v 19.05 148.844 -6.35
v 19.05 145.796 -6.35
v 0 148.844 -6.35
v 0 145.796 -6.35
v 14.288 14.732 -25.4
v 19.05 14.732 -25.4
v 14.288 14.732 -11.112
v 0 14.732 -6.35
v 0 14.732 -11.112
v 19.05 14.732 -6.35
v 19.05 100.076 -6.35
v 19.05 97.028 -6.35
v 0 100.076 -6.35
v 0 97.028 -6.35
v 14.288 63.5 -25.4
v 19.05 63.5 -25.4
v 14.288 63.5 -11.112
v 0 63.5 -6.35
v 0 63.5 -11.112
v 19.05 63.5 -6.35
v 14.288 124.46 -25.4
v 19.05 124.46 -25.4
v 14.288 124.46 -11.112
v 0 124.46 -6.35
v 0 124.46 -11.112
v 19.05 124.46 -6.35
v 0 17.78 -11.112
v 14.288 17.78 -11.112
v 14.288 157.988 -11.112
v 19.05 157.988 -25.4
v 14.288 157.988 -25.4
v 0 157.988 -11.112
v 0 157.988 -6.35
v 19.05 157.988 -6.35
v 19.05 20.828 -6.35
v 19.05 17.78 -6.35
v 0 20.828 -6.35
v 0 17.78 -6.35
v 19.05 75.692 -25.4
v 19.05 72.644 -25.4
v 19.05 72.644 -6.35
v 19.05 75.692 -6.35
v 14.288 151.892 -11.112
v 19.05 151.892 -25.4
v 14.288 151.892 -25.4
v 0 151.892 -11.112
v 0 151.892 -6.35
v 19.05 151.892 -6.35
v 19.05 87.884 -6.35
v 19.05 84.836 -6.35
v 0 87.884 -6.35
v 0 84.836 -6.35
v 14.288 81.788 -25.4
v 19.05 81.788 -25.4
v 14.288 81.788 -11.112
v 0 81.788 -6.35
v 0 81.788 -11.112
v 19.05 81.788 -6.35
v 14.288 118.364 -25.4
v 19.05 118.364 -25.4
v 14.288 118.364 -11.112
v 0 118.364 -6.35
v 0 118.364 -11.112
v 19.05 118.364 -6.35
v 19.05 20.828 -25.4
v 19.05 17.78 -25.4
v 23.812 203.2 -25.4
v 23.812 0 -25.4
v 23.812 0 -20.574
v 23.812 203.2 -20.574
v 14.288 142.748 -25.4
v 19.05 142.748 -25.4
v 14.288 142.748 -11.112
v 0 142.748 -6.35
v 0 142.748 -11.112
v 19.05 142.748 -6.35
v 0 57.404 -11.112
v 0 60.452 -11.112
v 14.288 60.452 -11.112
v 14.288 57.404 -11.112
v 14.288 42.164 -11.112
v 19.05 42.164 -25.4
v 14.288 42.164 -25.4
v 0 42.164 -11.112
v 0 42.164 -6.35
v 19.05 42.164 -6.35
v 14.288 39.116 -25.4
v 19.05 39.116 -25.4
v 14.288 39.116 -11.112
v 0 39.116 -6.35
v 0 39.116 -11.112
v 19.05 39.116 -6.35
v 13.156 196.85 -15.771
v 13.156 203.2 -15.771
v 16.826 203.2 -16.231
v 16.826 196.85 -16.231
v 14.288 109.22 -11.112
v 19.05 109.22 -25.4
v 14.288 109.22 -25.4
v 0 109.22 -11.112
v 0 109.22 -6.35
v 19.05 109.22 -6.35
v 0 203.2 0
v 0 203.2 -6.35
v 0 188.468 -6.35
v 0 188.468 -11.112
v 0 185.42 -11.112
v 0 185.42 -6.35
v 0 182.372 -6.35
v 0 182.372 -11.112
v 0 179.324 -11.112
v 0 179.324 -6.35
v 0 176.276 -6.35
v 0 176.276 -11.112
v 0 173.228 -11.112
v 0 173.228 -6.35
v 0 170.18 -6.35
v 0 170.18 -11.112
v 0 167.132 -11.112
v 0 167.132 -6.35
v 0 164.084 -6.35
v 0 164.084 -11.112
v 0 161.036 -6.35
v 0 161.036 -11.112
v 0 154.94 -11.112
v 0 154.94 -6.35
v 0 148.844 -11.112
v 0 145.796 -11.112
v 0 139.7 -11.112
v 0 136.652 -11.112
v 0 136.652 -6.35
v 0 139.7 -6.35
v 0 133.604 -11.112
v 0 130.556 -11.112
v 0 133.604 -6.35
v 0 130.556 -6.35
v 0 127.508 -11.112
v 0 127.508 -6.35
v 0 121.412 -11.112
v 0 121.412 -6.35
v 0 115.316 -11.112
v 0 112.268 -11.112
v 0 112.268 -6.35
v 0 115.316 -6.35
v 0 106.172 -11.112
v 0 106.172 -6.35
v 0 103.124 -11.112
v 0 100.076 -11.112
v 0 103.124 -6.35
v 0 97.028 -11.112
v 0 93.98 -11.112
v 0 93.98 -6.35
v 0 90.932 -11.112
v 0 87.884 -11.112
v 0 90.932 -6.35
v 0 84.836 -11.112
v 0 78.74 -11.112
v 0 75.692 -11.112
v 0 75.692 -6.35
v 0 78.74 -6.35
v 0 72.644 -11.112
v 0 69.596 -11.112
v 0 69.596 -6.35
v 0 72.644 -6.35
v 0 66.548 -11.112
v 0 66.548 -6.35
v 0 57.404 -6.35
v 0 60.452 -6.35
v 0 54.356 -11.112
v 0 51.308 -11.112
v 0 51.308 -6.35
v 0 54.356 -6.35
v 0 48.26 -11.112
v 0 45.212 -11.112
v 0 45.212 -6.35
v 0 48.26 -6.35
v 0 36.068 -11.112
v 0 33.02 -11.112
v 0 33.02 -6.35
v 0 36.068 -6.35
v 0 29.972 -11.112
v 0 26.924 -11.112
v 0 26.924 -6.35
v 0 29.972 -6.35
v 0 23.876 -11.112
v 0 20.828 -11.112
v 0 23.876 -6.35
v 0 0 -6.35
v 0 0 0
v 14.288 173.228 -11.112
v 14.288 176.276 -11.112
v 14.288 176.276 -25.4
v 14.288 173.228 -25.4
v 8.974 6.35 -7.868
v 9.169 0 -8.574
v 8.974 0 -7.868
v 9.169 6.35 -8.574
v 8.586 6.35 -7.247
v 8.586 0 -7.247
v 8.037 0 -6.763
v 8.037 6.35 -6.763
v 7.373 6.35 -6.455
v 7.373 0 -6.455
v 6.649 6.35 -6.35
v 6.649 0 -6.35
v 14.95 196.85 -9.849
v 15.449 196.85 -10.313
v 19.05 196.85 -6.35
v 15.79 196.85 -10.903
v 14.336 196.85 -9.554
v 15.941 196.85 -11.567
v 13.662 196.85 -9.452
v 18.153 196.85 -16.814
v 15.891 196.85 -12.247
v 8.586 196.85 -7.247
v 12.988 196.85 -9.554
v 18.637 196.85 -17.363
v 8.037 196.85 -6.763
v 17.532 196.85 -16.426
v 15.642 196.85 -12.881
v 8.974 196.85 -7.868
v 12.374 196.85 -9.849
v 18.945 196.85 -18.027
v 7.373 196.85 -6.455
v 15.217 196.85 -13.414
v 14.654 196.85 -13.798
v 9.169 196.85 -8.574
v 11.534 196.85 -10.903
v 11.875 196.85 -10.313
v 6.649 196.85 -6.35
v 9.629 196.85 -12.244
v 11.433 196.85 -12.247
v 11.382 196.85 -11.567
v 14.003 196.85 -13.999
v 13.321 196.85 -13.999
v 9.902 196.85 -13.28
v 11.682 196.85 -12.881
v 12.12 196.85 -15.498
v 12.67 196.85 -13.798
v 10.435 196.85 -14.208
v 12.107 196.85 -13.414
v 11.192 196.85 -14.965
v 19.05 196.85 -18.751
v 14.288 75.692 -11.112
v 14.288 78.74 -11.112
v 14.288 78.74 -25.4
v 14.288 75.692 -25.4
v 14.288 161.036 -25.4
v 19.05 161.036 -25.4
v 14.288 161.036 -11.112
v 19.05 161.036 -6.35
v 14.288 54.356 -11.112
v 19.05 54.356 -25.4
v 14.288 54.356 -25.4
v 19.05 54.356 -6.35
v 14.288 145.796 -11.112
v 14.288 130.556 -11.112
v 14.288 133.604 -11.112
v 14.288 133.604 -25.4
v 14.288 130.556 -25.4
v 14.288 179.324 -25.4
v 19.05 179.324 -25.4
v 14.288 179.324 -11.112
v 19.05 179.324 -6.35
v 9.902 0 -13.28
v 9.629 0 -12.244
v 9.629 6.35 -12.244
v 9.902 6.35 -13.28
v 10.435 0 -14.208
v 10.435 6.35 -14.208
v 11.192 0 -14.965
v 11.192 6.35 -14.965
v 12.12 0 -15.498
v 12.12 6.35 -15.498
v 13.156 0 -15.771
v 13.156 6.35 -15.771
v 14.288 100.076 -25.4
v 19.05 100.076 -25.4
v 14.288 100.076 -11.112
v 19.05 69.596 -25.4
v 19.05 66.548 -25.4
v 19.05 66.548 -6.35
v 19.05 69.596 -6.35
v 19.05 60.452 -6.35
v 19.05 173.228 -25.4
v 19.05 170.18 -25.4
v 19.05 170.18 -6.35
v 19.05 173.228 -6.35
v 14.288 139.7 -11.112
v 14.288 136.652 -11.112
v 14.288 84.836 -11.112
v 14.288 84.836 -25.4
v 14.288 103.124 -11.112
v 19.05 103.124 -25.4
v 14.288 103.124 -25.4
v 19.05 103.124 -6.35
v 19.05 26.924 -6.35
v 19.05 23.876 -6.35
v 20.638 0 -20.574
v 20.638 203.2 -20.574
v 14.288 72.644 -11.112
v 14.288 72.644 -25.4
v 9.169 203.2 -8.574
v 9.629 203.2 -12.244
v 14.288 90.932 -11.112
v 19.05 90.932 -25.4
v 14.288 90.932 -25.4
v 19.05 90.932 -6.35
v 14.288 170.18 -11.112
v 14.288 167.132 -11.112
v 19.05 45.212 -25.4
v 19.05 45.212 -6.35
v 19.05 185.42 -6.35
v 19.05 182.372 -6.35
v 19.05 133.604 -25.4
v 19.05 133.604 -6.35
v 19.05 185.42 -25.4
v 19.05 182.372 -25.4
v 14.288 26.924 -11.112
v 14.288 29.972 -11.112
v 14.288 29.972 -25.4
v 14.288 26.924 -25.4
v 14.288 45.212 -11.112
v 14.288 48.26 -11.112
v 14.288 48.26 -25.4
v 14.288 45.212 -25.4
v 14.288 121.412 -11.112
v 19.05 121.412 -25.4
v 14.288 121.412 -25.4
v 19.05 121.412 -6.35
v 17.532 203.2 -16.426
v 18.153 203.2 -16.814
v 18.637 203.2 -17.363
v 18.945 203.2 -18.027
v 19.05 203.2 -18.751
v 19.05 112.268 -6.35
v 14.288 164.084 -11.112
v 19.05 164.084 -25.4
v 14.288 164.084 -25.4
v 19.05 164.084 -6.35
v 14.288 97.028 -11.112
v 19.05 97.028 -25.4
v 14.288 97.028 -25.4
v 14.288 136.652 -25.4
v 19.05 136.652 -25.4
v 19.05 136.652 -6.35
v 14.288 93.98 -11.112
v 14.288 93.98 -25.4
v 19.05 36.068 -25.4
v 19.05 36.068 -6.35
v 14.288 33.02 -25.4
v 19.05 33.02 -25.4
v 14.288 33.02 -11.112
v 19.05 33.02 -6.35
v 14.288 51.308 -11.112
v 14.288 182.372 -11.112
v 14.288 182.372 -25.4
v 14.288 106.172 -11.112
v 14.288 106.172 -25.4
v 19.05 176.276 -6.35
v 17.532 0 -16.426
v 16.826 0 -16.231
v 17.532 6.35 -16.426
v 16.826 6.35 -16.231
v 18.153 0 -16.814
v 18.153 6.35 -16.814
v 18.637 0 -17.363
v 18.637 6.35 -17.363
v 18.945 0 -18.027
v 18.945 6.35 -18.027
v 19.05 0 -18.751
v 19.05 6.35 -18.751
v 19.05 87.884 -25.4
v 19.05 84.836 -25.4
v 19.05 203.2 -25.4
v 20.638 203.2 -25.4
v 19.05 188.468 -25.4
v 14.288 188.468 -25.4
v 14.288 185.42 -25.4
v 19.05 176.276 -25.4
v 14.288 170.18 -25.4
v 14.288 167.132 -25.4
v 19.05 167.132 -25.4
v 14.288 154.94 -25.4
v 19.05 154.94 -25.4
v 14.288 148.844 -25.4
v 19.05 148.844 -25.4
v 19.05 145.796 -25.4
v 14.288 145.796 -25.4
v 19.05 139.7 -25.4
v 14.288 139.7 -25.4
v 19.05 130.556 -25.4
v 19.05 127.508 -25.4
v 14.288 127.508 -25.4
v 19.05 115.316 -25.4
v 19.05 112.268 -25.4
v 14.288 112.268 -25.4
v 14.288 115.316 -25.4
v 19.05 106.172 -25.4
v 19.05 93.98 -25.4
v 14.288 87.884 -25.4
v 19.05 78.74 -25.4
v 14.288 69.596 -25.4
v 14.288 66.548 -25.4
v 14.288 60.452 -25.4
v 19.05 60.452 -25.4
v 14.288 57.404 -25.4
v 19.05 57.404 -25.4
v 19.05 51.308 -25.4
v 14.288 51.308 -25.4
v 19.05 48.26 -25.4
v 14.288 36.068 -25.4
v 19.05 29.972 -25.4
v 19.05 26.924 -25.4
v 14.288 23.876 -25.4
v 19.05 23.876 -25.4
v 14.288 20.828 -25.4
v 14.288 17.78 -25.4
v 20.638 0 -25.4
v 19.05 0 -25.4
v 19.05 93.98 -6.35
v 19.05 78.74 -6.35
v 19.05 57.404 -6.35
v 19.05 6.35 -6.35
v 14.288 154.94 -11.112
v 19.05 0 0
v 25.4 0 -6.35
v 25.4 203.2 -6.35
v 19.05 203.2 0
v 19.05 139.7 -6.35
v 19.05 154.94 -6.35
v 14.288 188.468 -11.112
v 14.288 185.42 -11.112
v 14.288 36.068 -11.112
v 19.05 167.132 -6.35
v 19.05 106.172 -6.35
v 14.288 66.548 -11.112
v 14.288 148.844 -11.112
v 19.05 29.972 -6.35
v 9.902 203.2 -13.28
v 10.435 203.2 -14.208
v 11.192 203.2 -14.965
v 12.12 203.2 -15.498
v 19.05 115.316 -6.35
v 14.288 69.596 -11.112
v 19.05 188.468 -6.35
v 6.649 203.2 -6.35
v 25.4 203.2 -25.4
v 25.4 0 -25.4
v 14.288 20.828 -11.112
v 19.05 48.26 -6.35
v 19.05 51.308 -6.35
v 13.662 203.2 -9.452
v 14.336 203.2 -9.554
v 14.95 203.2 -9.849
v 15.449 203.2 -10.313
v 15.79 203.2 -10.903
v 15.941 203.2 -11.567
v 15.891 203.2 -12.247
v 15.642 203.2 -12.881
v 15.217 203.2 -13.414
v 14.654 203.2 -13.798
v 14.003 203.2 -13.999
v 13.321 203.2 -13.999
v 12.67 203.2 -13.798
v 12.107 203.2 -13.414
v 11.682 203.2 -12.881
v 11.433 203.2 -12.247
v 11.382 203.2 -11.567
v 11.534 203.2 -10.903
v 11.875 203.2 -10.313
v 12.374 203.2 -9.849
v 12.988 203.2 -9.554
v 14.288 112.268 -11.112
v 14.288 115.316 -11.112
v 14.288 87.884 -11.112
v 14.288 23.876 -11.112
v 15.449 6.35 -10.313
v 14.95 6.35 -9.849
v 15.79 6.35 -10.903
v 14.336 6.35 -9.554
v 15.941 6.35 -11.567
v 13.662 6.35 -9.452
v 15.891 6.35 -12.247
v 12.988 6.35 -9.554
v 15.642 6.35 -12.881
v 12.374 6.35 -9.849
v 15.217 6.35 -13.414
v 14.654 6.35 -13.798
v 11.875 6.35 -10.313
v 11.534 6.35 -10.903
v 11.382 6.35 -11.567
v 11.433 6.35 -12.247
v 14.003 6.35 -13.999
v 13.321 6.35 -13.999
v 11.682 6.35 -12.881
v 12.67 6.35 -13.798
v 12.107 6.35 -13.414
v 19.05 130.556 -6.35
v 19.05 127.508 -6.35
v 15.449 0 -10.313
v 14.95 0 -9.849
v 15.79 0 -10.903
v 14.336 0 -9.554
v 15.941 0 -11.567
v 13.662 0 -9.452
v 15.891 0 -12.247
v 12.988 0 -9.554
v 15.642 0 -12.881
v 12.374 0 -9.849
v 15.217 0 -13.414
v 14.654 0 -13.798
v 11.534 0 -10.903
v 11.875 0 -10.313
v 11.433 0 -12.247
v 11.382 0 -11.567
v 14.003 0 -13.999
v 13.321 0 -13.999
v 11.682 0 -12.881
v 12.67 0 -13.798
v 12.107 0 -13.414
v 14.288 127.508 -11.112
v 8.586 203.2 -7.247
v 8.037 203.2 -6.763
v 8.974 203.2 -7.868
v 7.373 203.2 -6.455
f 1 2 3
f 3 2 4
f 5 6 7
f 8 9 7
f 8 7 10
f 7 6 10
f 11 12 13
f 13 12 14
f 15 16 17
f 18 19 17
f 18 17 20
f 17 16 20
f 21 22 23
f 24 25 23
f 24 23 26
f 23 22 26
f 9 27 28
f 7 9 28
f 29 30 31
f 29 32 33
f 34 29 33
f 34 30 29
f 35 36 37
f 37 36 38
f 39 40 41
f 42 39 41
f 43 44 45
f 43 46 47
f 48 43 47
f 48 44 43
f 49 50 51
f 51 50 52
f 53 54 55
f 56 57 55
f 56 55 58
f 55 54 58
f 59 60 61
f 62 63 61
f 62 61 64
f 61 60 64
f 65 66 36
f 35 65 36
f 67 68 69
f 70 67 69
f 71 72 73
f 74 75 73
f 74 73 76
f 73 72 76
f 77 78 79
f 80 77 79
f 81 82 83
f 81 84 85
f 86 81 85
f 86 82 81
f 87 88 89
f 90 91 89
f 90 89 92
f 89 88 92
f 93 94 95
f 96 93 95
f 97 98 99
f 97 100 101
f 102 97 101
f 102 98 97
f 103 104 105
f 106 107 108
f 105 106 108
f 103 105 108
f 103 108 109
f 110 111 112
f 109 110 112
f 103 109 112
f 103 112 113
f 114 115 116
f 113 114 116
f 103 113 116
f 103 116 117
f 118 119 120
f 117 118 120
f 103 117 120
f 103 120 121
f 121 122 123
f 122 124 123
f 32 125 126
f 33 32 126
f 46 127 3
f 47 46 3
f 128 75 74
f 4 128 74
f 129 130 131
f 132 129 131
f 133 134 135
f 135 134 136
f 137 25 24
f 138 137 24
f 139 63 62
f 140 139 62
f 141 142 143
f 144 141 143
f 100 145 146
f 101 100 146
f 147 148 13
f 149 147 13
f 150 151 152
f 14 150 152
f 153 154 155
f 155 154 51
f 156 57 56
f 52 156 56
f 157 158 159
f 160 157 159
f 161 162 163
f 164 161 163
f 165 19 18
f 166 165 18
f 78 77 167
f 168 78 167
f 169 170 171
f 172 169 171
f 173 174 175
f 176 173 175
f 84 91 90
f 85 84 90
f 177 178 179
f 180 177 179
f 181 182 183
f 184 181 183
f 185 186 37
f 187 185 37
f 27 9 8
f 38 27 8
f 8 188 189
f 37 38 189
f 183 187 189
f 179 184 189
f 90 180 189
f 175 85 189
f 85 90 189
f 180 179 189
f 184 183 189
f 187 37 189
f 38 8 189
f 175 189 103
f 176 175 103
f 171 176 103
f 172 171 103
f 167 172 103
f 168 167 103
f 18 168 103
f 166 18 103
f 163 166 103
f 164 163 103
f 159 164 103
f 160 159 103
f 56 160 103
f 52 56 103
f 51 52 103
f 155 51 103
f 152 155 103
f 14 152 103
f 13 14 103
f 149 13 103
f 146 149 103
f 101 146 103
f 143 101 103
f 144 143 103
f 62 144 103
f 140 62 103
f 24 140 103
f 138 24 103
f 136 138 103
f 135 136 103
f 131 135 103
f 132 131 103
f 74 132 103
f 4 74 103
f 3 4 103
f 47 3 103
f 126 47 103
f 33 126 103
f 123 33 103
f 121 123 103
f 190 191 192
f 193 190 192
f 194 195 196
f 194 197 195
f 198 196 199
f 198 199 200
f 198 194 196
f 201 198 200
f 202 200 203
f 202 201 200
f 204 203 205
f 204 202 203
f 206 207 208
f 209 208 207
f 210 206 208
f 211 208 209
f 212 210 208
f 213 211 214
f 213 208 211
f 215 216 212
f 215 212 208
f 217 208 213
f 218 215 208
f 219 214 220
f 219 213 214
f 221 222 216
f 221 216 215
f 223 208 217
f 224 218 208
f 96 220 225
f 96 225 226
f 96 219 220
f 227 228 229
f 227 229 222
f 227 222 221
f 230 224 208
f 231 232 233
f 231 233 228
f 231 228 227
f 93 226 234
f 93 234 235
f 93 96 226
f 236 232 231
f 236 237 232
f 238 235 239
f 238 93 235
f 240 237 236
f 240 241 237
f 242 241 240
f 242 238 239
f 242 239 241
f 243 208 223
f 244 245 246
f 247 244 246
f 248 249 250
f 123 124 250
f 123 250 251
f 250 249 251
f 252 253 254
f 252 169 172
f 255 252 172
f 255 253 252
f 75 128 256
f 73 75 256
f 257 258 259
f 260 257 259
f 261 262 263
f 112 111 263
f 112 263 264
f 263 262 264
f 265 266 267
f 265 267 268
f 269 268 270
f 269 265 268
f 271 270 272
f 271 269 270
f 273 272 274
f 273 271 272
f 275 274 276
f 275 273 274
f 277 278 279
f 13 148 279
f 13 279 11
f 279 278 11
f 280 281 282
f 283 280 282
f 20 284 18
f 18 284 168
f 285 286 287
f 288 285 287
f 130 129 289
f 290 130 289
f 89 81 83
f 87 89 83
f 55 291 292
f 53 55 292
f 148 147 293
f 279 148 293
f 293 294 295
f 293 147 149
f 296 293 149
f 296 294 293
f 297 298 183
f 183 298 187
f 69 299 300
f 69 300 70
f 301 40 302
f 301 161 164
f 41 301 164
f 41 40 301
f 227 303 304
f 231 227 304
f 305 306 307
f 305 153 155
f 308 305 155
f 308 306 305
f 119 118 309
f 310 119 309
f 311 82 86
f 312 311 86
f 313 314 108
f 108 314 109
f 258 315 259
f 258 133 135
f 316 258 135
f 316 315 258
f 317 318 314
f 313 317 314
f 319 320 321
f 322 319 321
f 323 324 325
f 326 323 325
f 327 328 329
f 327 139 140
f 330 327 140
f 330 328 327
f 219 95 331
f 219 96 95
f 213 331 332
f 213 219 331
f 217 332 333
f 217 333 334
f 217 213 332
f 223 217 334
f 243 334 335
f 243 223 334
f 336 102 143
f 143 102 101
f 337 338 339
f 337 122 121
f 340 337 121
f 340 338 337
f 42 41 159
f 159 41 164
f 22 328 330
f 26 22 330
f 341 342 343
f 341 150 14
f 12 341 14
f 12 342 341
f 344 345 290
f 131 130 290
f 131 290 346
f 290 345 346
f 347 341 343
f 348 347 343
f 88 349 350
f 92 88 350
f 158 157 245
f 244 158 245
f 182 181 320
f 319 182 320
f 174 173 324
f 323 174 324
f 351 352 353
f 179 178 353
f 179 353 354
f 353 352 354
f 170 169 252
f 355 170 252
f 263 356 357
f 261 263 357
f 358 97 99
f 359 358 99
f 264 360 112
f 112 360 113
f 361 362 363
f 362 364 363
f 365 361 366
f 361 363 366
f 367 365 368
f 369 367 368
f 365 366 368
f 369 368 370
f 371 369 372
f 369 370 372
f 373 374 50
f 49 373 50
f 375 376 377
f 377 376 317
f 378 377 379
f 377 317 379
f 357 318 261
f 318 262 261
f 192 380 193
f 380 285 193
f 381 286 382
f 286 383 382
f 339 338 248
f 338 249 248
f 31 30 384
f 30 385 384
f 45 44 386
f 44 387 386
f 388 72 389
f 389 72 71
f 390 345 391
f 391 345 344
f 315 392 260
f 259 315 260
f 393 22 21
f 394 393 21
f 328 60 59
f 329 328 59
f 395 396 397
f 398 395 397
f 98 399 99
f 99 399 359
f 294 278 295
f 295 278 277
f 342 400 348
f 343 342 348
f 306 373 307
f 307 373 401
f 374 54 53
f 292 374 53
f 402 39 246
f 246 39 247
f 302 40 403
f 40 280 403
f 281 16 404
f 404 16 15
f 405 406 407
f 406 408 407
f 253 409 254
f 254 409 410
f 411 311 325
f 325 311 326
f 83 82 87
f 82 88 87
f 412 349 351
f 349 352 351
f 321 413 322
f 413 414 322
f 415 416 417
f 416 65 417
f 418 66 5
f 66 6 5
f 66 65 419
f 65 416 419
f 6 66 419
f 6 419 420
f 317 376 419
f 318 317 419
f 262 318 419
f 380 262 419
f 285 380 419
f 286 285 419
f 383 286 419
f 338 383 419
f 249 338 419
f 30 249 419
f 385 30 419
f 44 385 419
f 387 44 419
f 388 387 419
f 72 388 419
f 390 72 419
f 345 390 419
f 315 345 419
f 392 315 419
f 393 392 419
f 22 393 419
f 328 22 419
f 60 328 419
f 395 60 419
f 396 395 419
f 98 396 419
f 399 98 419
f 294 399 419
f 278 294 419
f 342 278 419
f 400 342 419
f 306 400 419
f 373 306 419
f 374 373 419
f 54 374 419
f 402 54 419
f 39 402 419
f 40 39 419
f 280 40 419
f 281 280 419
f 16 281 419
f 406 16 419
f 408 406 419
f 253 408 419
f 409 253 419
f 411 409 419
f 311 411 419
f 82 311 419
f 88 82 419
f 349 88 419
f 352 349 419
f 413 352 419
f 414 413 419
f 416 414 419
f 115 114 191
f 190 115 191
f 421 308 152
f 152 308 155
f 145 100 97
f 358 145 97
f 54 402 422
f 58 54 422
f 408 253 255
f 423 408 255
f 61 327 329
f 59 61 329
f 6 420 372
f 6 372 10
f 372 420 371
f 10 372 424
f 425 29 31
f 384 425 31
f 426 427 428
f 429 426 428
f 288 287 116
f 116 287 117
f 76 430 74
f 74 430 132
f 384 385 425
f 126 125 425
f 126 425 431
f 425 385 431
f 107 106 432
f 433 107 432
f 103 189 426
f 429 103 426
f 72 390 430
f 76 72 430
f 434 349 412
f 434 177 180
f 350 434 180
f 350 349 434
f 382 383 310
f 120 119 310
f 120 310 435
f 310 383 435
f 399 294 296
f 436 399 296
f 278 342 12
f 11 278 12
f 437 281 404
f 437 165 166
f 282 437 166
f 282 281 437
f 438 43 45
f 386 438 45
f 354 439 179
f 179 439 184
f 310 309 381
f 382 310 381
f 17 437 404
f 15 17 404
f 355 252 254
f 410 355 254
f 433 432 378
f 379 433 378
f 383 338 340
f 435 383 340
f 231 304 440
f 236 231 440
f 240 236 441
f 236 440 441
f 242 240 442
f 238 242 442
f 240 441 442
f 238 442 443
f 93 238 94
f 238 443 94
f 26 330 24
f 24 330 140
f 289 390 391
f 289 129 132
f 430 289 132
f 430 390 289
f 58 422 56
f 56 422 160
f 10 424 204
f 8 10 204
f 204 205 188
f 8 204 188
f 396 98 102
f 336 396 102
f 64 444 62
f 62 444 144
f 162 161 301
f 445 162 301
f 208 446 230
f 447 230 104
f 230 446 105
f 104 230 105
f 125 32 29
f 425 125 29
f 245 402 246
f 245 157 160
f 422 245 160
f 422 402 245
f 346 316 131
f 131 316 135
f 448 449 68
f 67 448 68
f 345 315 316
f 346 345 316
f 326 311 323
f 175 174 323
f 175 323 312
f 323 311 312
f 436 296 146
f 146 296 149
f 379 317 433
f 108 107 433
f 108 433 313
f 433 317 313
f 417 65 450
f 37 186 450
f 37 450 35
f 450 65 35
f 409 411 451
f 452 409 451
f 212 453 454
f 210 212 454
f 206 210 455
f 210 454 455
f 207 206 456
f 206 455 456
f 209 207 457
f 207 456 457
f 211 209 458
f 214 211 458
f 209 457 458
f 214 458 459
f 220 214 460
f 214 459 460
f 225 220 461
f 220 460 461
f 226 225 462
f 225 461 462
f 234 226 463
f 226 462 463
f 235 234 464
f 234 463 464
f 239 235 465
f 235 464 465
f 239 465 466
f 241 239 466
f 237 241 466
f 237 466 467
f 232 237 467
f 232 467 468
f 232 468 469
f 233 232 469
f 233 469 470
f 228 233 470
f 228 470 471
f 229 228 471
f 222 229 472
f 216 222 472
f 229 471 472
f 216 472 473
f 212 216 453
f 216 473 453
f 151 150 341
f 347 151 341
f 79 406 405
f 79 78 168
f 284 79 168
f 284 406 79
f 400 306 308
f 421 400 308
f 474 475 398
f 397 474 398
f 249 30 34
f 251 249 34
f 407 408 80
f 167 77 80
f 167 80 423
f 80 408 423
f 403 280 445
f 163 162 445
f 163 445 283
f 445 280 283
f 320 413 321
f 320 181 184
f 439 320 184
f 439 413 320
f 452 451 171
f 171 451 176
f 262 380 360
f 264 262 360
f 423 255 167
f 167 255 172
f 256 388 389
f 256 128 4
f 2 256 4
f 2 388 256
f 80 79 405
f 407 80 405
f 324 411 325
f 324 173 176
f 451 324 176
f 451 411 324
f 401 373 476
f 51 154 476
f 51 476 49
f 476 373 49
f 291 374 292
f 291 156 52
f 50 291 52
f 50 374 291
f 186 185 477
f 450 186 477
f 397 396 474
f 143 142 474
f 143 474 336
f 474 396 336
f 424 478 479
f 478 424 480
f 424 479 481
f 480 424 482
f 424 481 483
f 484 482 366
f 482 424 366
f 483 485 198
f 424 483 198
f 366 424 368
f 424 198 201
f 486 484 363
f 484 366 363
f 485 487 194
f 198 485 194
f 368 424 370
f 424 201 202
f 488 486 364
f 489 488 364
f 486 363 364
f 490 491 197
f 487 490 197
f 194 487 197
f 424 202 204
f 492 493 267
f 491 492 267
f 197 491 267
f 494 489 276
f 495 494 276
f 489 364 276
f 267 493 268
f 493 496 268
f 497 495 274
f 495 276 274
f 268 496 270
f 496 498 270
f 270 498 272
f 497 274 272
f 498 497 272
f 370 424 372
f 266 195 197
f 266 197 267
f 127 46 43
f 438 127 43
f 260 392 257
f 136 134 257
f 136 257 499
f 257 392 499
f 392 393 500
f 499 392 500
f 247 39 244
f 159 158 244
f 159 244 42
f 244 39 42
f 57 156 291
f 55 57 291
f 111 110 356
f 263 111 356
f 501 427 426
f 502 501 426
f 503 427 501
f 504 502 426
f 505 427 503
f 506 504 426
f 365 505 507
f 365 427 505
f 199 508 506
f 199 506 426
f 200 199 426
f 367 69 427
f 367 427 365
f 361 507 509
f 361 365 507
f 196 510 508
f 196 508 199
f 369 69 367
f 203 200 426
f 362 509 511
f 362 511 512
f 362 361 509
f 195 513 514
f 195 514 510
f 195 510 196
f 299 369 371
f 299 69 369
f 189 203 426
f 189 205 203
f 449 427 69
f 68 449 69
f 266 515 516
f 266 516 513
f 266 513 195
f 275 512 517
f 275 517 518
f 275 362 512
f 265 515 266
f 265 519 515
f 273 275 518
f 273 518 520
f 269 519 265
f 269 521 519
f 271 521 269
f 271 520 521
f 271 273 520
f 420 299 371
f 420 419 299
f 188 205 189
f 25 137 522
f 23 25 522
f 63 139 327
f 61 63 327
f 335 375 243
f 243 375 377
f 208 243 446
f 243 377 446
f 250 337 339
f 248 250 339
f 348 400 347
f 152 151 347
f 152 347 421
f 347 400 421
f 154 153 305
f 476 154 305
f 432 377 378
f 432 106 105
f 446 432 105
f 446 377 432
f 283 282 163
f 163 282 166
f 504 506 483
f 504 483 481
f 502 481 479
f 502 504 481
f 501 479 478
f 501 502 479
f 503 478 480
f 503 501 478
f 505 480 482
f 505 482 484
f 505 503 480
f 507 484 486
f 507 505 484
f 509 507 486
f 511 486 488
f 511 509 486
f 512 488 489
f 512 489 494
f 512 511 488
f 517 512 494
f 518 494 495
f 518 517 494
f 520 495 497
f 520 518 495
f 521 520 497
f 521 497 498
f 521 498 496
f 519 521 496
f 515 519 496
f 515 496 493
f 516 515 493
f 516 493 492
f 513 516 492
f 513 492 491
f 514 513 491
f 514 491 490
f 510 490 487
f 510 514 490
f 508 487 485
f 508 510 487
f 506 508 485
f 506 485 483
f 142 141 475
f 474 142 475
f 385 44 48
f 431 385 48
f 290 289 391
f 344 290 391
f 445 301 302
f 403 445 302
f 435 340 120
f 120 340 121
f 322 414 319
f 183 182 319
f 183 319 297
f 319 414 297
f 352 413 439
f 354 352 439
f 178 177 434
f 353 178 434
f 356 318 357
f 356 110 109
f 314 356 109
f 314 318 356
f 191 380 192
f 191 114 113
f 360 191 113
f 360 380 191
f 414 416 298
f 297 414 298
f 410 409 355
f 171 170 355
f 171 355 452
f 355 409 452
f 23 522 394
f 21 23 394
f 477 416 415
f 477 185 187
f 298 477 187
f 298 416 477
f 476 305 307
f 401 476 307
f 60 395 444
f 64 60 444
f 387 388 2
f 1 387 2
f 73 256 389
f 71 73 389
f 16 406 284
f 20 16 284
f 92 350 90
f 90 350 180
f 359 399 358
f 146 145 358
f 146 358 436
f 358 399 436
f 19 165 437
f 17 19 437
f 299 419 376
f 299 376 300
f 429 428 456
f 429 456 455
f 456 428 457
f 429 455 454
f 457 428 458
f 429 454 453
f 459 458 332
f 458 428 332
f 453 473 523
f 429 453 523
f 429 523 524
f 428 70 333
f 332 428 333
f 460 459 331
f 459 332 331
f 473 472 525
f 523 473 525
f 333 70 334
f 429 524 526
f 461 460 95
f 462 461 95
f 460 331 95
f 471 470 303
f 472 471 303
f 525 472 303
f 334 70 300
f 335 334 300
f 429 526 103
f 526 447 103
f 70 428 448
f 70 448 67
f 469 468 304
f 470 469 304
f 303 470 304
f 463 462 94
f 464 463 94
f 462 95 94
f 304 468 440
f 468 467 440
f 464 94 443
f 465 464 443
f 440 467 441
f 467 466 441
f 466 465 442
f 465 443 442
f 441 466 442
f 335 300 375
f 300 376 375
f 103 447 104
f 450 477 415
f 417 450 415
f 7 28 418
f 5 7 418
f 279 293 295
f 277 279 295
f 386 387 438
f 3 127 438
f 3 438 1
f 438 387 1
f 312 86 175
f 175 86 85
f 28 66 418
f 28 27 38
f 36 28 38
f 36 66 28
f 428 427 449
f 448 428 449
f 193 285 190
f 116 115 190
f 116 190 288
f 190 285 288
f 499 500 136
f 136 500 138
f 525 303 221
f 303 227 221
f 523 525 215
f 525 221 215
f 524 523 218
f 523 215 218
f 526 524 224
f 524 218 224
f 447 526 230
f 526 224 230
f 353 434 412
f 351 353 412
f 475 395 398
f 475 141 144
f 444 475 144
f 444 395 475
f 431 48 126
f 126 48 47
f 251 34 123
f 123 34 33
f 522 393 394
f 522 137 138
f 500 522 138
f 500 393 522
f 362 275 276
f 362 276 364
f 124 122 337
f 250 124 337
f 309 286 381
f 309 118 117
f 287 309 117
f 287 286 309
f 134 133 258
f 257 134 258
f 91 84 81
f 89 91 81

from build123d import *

# Parameters (mm, degrees)
BOSS_EXTRUDE1_DEPTH  = 203.2
SKETCH2_R            = 2.286
BOSS_EXTRUDE2_DEPTH  = 6.35
FILLET1_R            = 2.54
FILLET1_OF_MIRROR1_R = 2.54
SKETCH4_W            = 3.175
SKETCH4_H            = 4.826
CUT_EXTRUDE2_DEPTH   = 207.350575478
SKETCH5_W            = 19.05
SKETCH5_H            = 3.048
BOSS_EXTRUDE3_DEPTH  = 19.05
CHAMFER1_SIZE        = 6.35
CUT_EXTRUDE3_REACH   = 193.861
SKETCH6_W            = 14.2875
SKETCH6_H            = 14.2875


with BuildPart() as part:
    # Sketch1 → Boss-Extrude1 (new body)
    with BuildSketch(Plane(origin=(0, 0, 0), x_dir=(1, 0, 0), z_dir=(0, 1, 0))):
        Polygon((0, 0), (25.4, 0), (25.4, 25.4), (19.05, 25.4), (19.05, 6.35), (0, 6.35), align=None)
    extrude(amount=BOSS_EXTRUDE1_DEPTH)

    # Sketch2 → Boss-Extrude2 (add)
    with BuildSketch(Plane(origin=(0, 203.2, 0), x_dir=(1, 0, 0), z_dir=(0, 1, 0))):
        with BuildLine():
            Line((19.05, 16.51), (19.05, 6.35))
            Line((19.05, 6.35), (8.89, 6.35))
            Line((8.89, 6.35), (9.629456844, 12.244049961))
            ThreePointArc((9.629456844, 12.244049961), (10.788164369, 14.611835631), (13.155950039, 15.770543156))
            Line((13.155950039, 15.770543156), (19.05, 16.51))
        make_face()
        with Locations(Location((13.661846327, 11.738153673, 0), (0, 0, 270))):
            Circle(SKETCH2_R, mode=Mode.SUBTRACT)
    boss_extrude2 = extrude(amount=-BOSS_EXTRUDE2_DEPTH)

    # Fillet1
    fillet1_edges = [part.edges().sort_by_distance(p)[0] for p in [
        (8.89, 200.025, -6.35),
        (19.05, 200.025, -16.51),
    ]]
    fillet(fillet1_edges, radius=FILLET1_R)

    # Mirror1: Boss-Extrude2 across plane
    add(boss_extrude2.mirror(Plane.ZX.offset(101.6)))

    # Fillet1 of Mirror1
    fillet1_of_mirror1_edges = [part.edges().sort_by_distance(p)[0] for p in [
        (8.89, 3.175, -6.35),
        (19.05, 3.175, -16.51),
    ]]
    fillet(fillet1_of_mirror1_edges, radius=FILLET1_OF_MIRROR1_R)

    # Sketch4 → Cut-Extrude2 (cut, through all)
    with BuildSketch(Plane.XZ):
        with Locations((22.225, -22.987)):
            Rectangle(SKETCH4_W, SKETCH4_H)
    extrude(amount=-CUT_EXTRUDE2_DEPTH, mode=Mode.SUBTRACT)

    # Sketch5 → Boss-Extrude3 (add)
    with BuildSketch(Plane.ZY.offset(-19.05)):
        with Locations((-15.875, 180.848)):
            Rectangle(SKETCH5_W, SKETCH5_H)
        with Locations((-15.875, 186.944)):
            Rectangle(SKETCH5_W, SKETCH5_H)
        with Locations((-15.875, 174.752)):
            Rectangle(SKETCH5_W, SKETCH5_H)
        with Locations((-15.875, 168.656)):
            Rectangle(SKETCH5_W, SKETCH5_H)
        with Locations((-15.875, 162.56)):
            Rectangle(SKETCH5_W, SKETCH5_H)
        with Locations((-15.875, 156.464)):
            Rectangle(SKETCH5_W, SKETCH5_H)
        with Locations((-15.875, 150.368)):
            Rectangle(SKETCH5_W, SKETCH5_H)
        with Locations((-15.875, 144.272)):
            Rectangle(SKETCH5_W, SKETCH5_H)
        with Locations((-15.875, 138.176)):
            Rectangle(SKETCH5_W, SKETCH5_H)
        with Locations((-15.875, 132.08)):
            Rectangle(SKETCH5_W, SKETCH5_H)
        with Locations((-15.875, 125.984)):
            Rectangle(SKETCH5_W, SKETCH5_H)
        with Locations((-15.875, 119.888)):
            Rectangle(SKETCH5_W, SKETCH5_H)
        with Locations((-15.875, 113.792)):
            Rectangle(SKETCH5_W, SKETCH5_H)
        with Locations((-15.875, 107.696)):
            Rectangle(SKETCH5_W, SKETCH5_H)
        with Locations((-15.875, 101.6)):
            Rectangle(SKETCH5_W, SKETCH5_H)
        with Locations((-15.875, 95.504)):
            Rectangle(SKETCH5_W, SKETCH5_H)
        with Locations((-15.875, 89.408)):
            Rectangle(SKETCH5_W, SKETCH5_H)
        with Locations((-15.875, 83.312)):
            Rectangle(SKETCH5_W, SKETCH5_H)
        with Locations((-15.875, 77.216)):
            Rectangle(SKETCH5_W, SKETCH5_H)
        with Locations((-15.875, 71.12)):
            Rectangle(SKETCH5_W, SKETCH5_H)
        with Locations((-15.875, 65.024)):
            Rectangle(SKETCH5_W, SKETCH5_H)
        with Locations((-15.875, 58.928)):
            Rectangle(SKETCH5_W, SKETCH5_H)
        with Locations((-15.875, 52.832)):
            Rectangle(SKETCH5_W, SKETCH5_H)
        with Locations((-15.875, 46.736)):
            Rectangle(SKETCH5_W, SKETCH5_H)
        with Locations((-15.875, 40.64)):
            Rectangle(SKETCH5_W, SKETCH5_H)
        with Locations((-15.875, 34.544)):
            Rectangle(SKETCH5_W, SKETCH5_H)
        with Locations((-15.875, 28.448)):
            Rectangle(SKETCH5_W, SKETCH5_H)
        with Locations((-15.875, 22.352)):
            Rectangle(SKETCH5_W, SKETCH5_H)
        with Locations((-15.875, 16.256)):
            Rectangle(SKETCH5_W, SKETCH5_H)
    extrude(amount=BOSS_EXTRUDE3_DEPTH)

    # Chamfer1
    chamfer1_edges = [part.edges().sort_by_distance(p)[0] for p in [
        (25.4, 101.6, 0),
    ]]
    chamfer(chamfer1_edges, length=CHAMFER1_SIZE)

    # Cut-Extrude3: up to this face of the body (flat: up to its plane)
    cut_extrude3_end = Plane(part.part.faces().sort_by_distance((9.525, 14.732, -15.875))[0])
    # Sketch6 → Cut-Extrude3 (cut, up to the picked face)
    with BuildSketch(Plane(origin=(0, 188.468, 0), x_dir=(1, 0, 0), z_dir=(0, 1, 0)), mode=Mode.PRIVATE) as cut_extrude3_sk1:
        with Locations((7.14375, 18.25625)):
            Rectangle(SKETCH6_W, SKETCH6_H)
    cut_extrude3_tool1 = split(extrude(cut_extrude3_sk1.sketch, amount=-CUT_EXTRUDE3_REACH, mode=Mode.PRIVATE), bisect_by=cut_extrude3_end, keep=Keep.BOTH, mode=Mode.PRIVATE)
    add(cut_extrude3_tool1.solids().sort_by(Axis((7.14375, 188.468, -18.25625), (0, -1, 0)))[0], mode=Mode.SUBTRACT)


solid = part.part
